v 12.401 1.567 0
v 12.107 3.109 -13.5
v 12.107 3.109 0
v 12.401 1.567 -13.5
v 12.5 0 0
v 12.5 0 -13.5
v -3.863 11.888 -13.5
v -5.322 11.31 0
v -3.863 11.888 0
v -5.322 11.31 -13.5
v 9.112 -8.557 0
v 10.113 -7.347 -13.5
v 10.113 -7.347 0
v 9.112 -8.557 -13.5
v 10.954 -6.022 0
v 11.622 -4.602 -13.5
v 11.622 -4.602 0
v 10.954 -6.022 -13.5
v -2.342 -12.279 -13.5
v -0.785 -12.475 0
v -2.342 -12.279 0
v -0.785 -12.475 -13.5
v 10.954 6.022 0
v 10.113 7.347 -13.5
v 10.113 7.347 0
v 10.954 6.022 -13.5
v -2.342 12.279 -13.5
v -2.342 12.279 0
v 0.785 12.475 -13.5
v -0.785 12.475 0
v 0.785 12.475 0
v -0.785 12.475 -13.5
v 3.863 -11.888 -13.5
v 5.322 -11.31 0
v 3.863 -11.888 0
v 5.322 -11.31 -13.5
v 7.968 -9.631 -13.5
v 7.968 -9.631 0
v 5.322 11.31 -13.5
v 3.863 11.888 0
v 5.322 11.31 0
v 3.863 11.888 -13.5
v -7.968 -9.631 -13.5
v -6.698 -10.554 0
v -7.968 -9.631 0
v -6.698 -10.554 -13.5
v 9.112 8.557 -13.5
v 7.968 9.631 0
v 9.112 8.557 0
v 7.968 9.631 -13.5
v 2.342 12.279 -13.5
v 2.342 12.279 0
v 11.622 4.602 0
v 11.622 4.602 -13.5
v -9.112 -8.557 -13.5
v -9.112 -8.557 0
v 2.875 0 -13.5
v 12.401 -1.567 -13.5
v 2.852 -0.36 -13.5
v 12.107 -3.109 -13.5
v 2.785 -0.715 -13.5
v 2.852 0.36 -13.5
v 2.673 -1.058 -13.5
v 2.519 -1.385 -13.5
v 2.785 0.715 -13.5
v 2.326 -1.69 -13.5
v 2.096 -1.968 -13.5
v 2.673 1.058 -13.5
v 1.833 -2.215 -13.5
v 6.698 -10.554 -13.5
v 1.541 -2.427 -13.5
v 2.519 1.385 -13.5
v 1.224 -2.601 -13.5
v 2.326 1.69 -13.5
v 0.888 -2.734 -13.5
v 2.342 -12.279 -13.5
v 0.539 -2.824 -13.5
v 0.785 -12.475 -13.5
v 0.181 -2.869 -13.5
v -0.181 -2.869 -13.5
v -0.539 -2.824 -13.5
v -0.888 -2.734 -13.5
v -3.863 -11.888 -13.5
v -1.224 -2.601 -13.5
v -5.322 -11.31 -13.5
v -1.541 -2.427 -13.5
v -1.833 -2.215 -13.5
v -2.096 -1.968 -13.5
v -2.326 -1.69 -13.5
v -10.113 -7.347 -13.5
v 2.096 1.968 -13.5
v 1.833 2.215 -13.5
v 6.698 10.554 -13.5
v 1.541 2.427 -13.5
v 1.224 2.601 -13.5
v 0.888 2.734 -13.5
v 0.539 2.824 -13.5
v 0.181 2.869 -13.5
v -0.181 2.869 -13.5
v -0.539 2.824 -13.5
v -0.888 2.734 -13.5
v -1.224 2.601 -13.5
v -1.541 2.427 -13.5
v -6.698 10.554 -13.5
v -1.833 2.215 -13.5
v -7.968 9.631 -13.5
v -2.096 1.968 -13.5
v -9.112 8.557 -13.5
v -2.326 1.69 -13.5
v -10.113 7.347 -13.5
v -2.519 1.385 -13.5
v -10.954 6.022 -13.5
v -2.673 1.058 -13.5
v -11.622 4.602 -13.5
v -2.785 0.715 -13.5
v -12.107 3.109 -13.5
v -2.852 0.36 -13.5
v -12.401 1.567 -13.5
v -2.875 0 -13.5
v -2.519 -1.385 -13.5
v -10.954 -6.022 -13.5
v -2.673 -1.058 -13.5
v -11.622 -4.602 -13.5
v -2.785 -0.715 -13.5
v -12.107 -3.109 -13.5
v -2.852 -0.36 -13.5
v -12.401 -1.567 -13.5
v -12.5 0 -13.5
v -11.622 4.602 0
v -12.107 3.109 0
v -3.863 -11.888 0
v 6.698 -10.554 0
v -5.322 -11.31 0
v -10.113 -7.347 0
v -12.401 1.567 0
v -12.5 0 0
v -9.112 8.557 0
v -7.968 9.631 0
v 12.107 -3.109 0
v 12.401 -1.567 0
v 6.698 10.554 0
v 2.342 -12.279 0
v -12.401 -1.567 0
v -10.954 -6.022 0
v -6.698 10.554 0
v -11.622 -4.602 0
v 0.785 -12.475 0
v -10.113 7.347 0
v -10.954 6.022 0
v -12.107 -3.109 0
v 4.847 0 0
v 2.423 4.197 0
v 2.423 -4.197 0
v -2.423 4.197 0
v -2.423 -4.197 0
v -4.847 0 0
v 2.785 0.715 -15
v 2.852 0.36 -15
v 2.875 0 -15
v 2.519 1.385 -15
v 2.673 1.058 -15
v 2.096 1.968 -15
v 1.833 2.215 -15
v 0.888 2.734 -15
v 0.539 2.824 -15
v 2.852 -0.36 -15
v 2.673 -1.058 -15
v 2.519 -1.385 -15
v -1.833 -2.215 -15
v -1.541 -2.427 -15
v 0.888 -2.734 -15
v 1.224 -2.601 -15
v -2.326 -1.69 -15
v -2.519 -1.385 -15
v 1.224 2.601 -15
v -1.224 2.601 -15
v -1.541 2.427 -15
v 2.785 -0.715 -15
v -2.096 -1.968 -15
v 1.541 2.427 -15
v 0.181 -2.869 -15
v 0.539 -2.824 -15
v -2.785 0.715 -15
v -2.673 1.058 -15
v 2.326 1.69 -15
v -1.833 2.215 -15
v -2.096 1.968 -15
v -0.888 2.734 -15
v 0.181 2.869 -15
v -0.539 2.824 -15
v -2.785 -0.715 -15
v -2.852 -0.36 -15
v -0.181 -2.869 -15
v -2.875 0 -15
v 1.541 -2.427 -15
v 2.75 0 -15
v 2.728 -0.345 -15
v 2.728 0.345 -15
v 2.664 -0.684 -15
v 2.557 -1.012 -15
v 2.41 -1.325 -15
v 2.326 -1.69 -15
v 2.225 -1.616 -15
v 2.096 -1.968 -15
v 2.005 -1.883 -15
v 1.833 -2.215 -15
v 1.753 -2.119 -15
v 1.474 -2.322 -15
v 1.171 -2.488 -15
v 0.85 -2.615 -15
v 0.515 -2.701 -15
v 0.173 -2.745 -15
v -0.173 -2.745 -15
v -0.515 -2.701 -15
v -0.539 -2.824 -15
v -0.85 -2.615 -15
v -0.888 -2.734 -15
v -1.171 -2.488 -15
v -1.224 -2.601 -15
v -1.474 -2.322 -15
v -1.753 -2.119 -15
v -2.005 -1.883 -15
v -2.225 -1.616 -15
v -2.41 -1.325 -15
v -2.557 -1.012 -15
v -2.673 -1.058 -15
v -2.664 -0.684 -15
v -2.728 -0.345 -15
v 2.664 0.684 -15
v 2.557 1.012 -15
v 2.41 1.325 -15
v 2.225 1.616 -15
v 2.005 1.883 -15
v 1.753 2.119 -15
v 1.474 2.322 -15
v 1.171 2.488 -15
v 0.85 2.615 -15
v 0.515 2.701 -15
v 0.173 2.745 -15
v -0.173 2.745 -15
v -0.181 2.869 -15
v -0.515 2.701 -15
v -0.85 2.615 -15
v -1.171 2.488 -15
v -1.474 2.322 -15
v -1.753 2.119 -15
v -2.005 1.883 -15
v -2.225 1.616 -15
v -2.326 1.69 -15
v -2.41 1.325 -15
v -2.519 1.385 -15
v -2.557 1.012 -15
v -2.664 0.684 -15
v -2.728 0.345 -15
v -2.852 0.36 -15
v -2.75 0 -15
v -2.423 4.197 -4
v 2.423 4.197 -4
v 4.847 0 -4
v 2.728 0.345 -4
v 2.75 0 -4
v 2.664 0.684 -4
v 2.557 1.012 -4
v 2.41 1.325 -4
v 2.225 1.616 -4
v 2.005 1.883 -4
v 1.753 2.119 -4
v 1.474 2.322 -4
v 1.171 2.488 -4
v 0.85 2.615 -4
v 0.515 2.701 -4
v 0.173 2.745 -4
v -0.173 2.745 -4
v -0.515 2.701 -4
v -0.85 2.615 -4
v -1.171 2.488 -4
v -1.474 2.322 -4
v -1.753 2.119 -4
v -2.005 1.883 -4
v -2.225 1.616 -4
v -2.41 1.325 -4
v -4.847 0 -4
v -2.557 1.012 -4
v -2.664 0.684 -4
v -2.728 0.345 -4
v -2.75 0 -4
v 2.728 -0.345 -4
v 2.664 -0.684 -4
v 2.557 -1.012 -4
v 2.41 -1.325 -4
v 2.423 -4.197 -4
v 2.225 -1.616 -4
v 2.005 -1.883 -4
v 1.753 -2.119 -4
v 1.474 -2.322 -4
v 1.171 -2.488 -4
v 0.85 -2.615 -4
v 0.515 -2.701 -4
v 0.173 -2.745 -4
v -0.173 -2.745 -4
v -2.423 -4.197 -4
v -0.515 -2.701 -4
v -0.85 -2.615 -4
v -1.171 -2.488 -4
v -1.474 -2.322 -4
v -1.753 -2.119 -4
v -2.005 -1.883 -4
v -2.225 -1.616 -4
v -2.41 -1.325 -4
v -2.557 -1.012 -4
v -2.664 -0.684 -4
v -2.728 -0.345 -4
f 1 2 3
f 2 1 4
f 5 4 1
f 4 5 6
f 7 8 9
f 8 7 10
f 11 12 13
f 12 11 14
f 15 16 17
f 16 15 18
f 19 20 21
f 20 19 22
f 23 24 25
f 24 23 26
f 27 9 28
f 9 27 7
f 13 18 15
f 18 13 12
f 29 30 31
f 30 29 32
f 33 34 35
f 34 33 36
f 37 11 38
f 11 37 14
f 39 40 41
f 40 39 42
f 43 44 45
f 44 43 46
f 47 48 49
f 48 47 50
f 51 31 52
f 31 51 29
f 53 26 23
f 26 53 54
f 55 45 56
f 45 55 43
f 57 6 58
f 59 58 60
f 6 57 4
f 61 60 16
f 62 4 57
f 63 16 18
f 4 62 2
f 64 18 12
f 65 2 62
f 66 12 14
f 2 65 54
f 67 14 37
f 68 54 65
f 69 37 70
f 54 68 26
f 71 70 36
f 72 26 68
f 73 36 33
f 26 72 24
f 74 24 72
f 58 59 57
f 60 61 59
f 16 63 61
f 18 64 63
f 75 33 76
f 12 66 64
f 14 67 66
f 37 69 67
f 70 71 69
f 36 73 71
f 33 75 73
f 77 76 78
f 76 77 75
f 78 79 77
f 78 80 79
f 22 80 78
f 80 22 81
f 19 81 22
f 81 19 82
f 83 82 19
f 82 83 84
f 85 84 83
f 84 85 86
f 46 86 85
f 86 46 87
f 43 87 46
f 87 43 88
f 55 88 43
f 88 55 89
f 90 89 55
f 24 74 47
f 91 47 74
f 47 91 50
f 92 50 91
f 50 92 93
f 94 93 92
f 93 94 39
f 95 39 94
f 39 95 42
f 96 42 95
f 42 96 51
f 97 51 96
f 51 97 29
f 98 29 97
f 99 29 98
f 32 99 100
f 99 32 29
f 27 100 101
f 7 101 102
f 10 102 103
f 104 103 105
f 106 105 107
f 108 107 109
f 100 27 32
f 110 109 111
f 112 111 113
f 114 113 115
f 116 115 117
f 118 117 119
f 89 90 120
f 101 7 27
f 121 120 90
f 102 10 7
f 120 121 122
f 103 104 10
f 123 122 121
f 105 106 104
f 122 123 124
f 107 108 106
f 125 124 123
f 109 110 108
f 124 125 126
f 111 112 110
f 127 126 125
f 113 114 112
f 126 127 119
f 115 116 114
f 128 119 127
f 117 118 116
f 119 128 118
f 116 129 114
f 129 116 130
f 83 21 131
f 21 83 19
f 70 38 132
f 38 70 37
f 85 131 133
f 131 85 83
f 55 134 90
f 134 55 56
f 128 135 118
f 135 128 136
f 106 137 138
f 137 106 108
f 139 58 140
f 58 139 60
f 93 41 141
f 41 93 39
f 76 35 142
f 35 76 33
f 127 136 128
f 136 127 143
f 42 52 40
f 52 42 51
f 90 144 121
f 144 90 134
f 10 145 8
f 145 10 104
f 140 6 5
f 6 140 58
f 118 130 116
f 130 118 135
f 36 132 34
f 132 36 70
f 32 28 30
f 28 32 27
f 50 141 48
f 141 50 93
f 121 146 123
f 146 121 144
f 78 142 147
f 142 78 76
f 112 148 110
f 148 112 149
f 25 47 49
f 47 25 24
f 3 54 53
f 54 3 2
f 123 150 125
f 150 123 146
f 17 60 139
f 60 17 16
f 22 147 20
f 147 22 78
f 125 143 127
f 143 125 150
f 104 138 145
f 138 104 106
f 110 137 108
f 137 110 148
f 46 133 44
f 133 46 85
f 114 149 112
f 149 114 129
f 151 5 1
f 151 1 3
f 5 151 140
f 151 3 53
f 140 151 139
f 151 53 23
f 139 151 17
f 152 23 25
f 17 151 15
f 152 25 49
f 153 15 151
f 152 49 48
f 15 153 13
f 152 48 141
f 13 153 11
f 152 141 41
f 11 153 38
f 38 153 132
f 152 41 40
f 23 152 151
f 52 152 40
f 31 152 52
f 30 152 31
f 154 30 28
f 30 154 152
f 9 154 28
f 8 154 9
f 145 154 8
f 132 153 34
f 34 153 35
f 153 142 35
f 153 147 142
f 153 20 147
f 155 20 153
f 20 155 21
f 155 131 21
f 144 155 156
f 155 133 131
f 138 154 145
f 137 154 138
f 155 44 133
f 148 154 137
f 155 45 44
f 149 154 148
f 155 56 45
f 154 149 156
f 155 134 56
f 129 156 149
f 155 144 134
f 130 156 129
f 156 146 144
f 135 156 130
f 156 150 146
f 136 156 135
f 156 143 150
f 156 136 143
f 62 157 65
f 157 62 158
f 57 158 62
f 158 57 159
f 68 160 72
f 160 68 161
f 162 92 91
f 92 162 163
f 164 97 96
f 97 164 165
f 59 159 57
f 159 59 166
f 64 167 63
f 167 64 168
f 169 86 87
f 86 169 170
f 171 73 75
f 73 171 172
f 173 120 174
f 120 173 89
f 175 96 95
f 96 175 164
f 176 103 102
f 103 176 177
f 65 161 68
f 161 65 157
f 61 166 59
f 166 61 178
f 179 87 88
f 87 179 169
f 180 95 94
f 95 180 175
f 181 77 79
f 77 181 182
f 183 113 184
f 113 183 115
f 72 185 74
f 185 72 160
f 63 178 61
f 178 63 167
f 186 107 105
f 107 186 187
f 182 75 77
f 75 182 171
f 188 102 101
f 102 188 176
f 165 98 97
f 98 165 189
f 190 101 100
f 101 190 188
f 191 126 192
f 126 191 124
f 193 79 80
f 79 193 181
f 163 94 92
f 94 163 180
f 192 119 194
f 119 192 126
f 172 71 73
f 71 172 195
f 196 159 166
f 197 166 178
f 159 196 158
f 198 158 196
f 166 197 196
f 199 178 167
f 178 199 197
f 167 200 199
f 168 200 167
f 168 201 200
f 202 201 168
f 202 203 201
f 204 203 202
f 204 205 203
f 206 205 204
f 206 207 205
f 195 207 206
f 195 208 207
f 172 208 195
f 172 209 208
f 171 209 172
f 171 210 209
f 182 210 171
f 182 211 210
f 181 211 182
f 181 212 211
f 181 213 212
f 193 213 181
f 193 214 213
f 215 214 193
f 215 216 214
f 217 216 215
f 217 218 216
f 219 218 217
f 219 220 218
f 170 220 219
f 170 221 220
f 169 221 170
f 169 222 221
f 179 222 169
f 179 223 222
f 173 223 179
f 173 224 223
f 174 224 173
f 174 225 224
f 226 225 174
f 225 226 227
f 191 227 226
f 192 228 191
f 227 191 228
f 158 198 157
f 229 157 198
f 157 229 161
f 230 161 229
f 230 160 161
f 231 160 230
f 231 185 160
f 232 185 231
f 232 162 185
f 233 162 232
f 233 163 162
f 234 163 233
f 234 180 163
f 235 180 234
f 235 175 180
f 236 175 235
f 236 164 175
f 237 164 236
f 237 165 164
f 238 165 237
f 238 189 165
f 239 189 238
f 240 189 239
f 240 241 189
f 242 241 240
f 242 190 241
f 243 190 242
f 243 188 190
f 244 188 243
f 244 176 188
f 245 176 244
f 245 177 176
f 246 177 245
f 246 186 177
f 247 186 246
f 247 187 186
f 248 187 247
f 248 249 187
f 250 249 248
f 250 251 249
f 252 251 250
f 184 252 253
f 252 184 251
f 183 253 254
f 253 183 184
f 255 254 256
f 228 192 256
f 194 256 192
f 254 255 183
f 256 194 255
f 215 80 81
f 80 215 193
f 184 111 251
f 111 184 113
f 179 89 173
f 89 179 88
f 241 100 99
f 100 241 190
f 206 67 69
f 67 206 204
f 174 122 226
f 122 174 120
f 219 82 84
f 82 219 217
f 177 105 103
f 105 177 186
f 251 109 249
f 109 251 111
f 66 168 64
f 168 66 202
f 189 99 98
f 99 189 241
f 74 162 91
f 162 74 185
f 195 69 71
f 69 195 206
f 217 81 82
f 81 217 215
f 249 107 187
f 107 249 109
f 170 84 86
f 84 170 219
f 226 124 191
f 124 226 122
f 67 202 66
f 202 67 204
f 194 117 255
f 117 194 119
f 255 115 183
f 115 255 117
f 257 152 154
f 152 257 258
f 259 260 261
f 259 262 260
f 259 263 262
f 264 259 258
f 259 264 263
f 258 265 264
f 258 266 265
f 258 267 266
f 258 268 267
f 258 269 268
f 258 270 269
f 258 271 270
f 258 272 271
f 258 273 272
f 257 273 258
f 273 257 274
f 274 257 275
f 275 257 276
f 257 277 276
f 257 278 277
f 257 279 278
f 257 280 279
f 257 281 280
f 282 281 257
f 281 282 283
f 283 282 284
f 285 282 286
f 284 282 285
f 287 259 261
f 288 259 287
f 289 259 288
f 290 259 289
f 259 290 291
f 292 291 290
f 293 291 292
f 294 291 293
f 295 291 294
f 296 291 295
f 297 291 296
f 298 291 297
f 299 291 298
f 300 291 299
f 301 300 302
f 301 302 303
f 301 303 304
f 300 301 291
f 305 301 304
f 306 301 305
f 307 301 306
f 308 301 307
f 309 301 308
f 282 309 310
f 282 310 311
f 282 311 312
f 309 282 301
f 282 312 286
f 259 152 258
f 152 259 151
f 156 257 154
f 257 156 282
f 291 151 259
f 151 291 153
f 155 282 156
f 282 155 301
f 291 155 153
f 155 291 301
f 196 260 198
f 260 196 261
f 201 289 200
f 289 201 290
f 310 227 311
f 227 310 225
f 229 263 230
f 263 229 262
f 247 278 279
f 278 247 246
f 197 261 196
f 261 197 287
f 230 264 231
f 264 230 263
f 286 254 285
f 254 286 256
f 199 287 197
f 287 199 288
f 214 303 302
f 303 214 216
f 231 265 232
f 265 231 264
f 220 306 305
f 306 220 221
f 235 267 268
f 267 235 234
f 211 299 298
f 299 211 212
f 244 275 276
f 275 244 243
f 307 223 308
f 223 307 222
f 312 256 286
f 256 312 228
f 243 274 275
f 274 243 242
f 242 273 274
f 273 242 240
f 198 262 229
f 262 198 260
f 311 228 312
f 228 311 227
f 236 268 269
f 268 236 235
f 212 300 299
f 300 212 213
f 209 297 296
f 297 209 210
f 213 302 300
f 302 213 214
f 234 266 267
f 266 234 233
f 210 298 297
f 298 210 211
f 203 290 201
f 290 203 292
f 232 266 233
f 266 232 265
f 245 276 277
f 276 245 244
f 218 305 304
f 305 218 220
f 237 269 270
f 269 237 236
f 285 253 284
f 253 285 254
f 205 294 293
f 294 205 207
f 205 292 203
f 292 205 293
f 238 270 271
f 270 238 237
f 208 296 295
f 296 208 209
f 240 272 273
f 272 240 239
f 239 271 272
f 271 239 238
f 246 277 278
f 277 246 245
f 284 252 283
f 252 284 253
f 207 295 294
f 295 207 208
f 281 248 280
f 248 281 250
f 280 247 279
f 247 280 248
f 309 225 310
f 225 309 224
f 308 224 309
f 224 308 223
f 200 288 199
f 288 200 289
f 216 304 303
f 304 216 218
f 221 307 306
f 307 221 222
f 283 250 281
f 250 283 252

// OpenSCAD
$fn = 50;


difference() {
	union() {
		translate(v = [0, 0, -13.5000000000]) {
			cylinder(h = 13.5000000000, r = 12.5000000000);
		}
		#translate(v = [0, 0, -15.0000000000]) {
			cylinder(h = 15, r = 2.8750000000);
		}
	}
	union() {
		translate(v = [0, 0, 0]) {
			rotate(a = [0, 0, 0]) {
				difference() {
					union() {
						translate(v = [0, 0, -4]) {
							linear_extrude(height = 4) {
								polygon(points = [[4.8468000000, 0.0000000000], [2.4234000000, 4.1974519271], [-2.4234000000, 4.1974519271], [-4.8468000000, 0.0000000000], [-2.4234000000, -4.1974519271], [2.4234000000, -4.1974519271]]);
							}
						}
					}
					union();
				}
			}
		}
		#translate(v = [0, 0, -100.0000000000]) {
			cylinder(h = 200, r = 2.7500000000);
		}
	}
}
